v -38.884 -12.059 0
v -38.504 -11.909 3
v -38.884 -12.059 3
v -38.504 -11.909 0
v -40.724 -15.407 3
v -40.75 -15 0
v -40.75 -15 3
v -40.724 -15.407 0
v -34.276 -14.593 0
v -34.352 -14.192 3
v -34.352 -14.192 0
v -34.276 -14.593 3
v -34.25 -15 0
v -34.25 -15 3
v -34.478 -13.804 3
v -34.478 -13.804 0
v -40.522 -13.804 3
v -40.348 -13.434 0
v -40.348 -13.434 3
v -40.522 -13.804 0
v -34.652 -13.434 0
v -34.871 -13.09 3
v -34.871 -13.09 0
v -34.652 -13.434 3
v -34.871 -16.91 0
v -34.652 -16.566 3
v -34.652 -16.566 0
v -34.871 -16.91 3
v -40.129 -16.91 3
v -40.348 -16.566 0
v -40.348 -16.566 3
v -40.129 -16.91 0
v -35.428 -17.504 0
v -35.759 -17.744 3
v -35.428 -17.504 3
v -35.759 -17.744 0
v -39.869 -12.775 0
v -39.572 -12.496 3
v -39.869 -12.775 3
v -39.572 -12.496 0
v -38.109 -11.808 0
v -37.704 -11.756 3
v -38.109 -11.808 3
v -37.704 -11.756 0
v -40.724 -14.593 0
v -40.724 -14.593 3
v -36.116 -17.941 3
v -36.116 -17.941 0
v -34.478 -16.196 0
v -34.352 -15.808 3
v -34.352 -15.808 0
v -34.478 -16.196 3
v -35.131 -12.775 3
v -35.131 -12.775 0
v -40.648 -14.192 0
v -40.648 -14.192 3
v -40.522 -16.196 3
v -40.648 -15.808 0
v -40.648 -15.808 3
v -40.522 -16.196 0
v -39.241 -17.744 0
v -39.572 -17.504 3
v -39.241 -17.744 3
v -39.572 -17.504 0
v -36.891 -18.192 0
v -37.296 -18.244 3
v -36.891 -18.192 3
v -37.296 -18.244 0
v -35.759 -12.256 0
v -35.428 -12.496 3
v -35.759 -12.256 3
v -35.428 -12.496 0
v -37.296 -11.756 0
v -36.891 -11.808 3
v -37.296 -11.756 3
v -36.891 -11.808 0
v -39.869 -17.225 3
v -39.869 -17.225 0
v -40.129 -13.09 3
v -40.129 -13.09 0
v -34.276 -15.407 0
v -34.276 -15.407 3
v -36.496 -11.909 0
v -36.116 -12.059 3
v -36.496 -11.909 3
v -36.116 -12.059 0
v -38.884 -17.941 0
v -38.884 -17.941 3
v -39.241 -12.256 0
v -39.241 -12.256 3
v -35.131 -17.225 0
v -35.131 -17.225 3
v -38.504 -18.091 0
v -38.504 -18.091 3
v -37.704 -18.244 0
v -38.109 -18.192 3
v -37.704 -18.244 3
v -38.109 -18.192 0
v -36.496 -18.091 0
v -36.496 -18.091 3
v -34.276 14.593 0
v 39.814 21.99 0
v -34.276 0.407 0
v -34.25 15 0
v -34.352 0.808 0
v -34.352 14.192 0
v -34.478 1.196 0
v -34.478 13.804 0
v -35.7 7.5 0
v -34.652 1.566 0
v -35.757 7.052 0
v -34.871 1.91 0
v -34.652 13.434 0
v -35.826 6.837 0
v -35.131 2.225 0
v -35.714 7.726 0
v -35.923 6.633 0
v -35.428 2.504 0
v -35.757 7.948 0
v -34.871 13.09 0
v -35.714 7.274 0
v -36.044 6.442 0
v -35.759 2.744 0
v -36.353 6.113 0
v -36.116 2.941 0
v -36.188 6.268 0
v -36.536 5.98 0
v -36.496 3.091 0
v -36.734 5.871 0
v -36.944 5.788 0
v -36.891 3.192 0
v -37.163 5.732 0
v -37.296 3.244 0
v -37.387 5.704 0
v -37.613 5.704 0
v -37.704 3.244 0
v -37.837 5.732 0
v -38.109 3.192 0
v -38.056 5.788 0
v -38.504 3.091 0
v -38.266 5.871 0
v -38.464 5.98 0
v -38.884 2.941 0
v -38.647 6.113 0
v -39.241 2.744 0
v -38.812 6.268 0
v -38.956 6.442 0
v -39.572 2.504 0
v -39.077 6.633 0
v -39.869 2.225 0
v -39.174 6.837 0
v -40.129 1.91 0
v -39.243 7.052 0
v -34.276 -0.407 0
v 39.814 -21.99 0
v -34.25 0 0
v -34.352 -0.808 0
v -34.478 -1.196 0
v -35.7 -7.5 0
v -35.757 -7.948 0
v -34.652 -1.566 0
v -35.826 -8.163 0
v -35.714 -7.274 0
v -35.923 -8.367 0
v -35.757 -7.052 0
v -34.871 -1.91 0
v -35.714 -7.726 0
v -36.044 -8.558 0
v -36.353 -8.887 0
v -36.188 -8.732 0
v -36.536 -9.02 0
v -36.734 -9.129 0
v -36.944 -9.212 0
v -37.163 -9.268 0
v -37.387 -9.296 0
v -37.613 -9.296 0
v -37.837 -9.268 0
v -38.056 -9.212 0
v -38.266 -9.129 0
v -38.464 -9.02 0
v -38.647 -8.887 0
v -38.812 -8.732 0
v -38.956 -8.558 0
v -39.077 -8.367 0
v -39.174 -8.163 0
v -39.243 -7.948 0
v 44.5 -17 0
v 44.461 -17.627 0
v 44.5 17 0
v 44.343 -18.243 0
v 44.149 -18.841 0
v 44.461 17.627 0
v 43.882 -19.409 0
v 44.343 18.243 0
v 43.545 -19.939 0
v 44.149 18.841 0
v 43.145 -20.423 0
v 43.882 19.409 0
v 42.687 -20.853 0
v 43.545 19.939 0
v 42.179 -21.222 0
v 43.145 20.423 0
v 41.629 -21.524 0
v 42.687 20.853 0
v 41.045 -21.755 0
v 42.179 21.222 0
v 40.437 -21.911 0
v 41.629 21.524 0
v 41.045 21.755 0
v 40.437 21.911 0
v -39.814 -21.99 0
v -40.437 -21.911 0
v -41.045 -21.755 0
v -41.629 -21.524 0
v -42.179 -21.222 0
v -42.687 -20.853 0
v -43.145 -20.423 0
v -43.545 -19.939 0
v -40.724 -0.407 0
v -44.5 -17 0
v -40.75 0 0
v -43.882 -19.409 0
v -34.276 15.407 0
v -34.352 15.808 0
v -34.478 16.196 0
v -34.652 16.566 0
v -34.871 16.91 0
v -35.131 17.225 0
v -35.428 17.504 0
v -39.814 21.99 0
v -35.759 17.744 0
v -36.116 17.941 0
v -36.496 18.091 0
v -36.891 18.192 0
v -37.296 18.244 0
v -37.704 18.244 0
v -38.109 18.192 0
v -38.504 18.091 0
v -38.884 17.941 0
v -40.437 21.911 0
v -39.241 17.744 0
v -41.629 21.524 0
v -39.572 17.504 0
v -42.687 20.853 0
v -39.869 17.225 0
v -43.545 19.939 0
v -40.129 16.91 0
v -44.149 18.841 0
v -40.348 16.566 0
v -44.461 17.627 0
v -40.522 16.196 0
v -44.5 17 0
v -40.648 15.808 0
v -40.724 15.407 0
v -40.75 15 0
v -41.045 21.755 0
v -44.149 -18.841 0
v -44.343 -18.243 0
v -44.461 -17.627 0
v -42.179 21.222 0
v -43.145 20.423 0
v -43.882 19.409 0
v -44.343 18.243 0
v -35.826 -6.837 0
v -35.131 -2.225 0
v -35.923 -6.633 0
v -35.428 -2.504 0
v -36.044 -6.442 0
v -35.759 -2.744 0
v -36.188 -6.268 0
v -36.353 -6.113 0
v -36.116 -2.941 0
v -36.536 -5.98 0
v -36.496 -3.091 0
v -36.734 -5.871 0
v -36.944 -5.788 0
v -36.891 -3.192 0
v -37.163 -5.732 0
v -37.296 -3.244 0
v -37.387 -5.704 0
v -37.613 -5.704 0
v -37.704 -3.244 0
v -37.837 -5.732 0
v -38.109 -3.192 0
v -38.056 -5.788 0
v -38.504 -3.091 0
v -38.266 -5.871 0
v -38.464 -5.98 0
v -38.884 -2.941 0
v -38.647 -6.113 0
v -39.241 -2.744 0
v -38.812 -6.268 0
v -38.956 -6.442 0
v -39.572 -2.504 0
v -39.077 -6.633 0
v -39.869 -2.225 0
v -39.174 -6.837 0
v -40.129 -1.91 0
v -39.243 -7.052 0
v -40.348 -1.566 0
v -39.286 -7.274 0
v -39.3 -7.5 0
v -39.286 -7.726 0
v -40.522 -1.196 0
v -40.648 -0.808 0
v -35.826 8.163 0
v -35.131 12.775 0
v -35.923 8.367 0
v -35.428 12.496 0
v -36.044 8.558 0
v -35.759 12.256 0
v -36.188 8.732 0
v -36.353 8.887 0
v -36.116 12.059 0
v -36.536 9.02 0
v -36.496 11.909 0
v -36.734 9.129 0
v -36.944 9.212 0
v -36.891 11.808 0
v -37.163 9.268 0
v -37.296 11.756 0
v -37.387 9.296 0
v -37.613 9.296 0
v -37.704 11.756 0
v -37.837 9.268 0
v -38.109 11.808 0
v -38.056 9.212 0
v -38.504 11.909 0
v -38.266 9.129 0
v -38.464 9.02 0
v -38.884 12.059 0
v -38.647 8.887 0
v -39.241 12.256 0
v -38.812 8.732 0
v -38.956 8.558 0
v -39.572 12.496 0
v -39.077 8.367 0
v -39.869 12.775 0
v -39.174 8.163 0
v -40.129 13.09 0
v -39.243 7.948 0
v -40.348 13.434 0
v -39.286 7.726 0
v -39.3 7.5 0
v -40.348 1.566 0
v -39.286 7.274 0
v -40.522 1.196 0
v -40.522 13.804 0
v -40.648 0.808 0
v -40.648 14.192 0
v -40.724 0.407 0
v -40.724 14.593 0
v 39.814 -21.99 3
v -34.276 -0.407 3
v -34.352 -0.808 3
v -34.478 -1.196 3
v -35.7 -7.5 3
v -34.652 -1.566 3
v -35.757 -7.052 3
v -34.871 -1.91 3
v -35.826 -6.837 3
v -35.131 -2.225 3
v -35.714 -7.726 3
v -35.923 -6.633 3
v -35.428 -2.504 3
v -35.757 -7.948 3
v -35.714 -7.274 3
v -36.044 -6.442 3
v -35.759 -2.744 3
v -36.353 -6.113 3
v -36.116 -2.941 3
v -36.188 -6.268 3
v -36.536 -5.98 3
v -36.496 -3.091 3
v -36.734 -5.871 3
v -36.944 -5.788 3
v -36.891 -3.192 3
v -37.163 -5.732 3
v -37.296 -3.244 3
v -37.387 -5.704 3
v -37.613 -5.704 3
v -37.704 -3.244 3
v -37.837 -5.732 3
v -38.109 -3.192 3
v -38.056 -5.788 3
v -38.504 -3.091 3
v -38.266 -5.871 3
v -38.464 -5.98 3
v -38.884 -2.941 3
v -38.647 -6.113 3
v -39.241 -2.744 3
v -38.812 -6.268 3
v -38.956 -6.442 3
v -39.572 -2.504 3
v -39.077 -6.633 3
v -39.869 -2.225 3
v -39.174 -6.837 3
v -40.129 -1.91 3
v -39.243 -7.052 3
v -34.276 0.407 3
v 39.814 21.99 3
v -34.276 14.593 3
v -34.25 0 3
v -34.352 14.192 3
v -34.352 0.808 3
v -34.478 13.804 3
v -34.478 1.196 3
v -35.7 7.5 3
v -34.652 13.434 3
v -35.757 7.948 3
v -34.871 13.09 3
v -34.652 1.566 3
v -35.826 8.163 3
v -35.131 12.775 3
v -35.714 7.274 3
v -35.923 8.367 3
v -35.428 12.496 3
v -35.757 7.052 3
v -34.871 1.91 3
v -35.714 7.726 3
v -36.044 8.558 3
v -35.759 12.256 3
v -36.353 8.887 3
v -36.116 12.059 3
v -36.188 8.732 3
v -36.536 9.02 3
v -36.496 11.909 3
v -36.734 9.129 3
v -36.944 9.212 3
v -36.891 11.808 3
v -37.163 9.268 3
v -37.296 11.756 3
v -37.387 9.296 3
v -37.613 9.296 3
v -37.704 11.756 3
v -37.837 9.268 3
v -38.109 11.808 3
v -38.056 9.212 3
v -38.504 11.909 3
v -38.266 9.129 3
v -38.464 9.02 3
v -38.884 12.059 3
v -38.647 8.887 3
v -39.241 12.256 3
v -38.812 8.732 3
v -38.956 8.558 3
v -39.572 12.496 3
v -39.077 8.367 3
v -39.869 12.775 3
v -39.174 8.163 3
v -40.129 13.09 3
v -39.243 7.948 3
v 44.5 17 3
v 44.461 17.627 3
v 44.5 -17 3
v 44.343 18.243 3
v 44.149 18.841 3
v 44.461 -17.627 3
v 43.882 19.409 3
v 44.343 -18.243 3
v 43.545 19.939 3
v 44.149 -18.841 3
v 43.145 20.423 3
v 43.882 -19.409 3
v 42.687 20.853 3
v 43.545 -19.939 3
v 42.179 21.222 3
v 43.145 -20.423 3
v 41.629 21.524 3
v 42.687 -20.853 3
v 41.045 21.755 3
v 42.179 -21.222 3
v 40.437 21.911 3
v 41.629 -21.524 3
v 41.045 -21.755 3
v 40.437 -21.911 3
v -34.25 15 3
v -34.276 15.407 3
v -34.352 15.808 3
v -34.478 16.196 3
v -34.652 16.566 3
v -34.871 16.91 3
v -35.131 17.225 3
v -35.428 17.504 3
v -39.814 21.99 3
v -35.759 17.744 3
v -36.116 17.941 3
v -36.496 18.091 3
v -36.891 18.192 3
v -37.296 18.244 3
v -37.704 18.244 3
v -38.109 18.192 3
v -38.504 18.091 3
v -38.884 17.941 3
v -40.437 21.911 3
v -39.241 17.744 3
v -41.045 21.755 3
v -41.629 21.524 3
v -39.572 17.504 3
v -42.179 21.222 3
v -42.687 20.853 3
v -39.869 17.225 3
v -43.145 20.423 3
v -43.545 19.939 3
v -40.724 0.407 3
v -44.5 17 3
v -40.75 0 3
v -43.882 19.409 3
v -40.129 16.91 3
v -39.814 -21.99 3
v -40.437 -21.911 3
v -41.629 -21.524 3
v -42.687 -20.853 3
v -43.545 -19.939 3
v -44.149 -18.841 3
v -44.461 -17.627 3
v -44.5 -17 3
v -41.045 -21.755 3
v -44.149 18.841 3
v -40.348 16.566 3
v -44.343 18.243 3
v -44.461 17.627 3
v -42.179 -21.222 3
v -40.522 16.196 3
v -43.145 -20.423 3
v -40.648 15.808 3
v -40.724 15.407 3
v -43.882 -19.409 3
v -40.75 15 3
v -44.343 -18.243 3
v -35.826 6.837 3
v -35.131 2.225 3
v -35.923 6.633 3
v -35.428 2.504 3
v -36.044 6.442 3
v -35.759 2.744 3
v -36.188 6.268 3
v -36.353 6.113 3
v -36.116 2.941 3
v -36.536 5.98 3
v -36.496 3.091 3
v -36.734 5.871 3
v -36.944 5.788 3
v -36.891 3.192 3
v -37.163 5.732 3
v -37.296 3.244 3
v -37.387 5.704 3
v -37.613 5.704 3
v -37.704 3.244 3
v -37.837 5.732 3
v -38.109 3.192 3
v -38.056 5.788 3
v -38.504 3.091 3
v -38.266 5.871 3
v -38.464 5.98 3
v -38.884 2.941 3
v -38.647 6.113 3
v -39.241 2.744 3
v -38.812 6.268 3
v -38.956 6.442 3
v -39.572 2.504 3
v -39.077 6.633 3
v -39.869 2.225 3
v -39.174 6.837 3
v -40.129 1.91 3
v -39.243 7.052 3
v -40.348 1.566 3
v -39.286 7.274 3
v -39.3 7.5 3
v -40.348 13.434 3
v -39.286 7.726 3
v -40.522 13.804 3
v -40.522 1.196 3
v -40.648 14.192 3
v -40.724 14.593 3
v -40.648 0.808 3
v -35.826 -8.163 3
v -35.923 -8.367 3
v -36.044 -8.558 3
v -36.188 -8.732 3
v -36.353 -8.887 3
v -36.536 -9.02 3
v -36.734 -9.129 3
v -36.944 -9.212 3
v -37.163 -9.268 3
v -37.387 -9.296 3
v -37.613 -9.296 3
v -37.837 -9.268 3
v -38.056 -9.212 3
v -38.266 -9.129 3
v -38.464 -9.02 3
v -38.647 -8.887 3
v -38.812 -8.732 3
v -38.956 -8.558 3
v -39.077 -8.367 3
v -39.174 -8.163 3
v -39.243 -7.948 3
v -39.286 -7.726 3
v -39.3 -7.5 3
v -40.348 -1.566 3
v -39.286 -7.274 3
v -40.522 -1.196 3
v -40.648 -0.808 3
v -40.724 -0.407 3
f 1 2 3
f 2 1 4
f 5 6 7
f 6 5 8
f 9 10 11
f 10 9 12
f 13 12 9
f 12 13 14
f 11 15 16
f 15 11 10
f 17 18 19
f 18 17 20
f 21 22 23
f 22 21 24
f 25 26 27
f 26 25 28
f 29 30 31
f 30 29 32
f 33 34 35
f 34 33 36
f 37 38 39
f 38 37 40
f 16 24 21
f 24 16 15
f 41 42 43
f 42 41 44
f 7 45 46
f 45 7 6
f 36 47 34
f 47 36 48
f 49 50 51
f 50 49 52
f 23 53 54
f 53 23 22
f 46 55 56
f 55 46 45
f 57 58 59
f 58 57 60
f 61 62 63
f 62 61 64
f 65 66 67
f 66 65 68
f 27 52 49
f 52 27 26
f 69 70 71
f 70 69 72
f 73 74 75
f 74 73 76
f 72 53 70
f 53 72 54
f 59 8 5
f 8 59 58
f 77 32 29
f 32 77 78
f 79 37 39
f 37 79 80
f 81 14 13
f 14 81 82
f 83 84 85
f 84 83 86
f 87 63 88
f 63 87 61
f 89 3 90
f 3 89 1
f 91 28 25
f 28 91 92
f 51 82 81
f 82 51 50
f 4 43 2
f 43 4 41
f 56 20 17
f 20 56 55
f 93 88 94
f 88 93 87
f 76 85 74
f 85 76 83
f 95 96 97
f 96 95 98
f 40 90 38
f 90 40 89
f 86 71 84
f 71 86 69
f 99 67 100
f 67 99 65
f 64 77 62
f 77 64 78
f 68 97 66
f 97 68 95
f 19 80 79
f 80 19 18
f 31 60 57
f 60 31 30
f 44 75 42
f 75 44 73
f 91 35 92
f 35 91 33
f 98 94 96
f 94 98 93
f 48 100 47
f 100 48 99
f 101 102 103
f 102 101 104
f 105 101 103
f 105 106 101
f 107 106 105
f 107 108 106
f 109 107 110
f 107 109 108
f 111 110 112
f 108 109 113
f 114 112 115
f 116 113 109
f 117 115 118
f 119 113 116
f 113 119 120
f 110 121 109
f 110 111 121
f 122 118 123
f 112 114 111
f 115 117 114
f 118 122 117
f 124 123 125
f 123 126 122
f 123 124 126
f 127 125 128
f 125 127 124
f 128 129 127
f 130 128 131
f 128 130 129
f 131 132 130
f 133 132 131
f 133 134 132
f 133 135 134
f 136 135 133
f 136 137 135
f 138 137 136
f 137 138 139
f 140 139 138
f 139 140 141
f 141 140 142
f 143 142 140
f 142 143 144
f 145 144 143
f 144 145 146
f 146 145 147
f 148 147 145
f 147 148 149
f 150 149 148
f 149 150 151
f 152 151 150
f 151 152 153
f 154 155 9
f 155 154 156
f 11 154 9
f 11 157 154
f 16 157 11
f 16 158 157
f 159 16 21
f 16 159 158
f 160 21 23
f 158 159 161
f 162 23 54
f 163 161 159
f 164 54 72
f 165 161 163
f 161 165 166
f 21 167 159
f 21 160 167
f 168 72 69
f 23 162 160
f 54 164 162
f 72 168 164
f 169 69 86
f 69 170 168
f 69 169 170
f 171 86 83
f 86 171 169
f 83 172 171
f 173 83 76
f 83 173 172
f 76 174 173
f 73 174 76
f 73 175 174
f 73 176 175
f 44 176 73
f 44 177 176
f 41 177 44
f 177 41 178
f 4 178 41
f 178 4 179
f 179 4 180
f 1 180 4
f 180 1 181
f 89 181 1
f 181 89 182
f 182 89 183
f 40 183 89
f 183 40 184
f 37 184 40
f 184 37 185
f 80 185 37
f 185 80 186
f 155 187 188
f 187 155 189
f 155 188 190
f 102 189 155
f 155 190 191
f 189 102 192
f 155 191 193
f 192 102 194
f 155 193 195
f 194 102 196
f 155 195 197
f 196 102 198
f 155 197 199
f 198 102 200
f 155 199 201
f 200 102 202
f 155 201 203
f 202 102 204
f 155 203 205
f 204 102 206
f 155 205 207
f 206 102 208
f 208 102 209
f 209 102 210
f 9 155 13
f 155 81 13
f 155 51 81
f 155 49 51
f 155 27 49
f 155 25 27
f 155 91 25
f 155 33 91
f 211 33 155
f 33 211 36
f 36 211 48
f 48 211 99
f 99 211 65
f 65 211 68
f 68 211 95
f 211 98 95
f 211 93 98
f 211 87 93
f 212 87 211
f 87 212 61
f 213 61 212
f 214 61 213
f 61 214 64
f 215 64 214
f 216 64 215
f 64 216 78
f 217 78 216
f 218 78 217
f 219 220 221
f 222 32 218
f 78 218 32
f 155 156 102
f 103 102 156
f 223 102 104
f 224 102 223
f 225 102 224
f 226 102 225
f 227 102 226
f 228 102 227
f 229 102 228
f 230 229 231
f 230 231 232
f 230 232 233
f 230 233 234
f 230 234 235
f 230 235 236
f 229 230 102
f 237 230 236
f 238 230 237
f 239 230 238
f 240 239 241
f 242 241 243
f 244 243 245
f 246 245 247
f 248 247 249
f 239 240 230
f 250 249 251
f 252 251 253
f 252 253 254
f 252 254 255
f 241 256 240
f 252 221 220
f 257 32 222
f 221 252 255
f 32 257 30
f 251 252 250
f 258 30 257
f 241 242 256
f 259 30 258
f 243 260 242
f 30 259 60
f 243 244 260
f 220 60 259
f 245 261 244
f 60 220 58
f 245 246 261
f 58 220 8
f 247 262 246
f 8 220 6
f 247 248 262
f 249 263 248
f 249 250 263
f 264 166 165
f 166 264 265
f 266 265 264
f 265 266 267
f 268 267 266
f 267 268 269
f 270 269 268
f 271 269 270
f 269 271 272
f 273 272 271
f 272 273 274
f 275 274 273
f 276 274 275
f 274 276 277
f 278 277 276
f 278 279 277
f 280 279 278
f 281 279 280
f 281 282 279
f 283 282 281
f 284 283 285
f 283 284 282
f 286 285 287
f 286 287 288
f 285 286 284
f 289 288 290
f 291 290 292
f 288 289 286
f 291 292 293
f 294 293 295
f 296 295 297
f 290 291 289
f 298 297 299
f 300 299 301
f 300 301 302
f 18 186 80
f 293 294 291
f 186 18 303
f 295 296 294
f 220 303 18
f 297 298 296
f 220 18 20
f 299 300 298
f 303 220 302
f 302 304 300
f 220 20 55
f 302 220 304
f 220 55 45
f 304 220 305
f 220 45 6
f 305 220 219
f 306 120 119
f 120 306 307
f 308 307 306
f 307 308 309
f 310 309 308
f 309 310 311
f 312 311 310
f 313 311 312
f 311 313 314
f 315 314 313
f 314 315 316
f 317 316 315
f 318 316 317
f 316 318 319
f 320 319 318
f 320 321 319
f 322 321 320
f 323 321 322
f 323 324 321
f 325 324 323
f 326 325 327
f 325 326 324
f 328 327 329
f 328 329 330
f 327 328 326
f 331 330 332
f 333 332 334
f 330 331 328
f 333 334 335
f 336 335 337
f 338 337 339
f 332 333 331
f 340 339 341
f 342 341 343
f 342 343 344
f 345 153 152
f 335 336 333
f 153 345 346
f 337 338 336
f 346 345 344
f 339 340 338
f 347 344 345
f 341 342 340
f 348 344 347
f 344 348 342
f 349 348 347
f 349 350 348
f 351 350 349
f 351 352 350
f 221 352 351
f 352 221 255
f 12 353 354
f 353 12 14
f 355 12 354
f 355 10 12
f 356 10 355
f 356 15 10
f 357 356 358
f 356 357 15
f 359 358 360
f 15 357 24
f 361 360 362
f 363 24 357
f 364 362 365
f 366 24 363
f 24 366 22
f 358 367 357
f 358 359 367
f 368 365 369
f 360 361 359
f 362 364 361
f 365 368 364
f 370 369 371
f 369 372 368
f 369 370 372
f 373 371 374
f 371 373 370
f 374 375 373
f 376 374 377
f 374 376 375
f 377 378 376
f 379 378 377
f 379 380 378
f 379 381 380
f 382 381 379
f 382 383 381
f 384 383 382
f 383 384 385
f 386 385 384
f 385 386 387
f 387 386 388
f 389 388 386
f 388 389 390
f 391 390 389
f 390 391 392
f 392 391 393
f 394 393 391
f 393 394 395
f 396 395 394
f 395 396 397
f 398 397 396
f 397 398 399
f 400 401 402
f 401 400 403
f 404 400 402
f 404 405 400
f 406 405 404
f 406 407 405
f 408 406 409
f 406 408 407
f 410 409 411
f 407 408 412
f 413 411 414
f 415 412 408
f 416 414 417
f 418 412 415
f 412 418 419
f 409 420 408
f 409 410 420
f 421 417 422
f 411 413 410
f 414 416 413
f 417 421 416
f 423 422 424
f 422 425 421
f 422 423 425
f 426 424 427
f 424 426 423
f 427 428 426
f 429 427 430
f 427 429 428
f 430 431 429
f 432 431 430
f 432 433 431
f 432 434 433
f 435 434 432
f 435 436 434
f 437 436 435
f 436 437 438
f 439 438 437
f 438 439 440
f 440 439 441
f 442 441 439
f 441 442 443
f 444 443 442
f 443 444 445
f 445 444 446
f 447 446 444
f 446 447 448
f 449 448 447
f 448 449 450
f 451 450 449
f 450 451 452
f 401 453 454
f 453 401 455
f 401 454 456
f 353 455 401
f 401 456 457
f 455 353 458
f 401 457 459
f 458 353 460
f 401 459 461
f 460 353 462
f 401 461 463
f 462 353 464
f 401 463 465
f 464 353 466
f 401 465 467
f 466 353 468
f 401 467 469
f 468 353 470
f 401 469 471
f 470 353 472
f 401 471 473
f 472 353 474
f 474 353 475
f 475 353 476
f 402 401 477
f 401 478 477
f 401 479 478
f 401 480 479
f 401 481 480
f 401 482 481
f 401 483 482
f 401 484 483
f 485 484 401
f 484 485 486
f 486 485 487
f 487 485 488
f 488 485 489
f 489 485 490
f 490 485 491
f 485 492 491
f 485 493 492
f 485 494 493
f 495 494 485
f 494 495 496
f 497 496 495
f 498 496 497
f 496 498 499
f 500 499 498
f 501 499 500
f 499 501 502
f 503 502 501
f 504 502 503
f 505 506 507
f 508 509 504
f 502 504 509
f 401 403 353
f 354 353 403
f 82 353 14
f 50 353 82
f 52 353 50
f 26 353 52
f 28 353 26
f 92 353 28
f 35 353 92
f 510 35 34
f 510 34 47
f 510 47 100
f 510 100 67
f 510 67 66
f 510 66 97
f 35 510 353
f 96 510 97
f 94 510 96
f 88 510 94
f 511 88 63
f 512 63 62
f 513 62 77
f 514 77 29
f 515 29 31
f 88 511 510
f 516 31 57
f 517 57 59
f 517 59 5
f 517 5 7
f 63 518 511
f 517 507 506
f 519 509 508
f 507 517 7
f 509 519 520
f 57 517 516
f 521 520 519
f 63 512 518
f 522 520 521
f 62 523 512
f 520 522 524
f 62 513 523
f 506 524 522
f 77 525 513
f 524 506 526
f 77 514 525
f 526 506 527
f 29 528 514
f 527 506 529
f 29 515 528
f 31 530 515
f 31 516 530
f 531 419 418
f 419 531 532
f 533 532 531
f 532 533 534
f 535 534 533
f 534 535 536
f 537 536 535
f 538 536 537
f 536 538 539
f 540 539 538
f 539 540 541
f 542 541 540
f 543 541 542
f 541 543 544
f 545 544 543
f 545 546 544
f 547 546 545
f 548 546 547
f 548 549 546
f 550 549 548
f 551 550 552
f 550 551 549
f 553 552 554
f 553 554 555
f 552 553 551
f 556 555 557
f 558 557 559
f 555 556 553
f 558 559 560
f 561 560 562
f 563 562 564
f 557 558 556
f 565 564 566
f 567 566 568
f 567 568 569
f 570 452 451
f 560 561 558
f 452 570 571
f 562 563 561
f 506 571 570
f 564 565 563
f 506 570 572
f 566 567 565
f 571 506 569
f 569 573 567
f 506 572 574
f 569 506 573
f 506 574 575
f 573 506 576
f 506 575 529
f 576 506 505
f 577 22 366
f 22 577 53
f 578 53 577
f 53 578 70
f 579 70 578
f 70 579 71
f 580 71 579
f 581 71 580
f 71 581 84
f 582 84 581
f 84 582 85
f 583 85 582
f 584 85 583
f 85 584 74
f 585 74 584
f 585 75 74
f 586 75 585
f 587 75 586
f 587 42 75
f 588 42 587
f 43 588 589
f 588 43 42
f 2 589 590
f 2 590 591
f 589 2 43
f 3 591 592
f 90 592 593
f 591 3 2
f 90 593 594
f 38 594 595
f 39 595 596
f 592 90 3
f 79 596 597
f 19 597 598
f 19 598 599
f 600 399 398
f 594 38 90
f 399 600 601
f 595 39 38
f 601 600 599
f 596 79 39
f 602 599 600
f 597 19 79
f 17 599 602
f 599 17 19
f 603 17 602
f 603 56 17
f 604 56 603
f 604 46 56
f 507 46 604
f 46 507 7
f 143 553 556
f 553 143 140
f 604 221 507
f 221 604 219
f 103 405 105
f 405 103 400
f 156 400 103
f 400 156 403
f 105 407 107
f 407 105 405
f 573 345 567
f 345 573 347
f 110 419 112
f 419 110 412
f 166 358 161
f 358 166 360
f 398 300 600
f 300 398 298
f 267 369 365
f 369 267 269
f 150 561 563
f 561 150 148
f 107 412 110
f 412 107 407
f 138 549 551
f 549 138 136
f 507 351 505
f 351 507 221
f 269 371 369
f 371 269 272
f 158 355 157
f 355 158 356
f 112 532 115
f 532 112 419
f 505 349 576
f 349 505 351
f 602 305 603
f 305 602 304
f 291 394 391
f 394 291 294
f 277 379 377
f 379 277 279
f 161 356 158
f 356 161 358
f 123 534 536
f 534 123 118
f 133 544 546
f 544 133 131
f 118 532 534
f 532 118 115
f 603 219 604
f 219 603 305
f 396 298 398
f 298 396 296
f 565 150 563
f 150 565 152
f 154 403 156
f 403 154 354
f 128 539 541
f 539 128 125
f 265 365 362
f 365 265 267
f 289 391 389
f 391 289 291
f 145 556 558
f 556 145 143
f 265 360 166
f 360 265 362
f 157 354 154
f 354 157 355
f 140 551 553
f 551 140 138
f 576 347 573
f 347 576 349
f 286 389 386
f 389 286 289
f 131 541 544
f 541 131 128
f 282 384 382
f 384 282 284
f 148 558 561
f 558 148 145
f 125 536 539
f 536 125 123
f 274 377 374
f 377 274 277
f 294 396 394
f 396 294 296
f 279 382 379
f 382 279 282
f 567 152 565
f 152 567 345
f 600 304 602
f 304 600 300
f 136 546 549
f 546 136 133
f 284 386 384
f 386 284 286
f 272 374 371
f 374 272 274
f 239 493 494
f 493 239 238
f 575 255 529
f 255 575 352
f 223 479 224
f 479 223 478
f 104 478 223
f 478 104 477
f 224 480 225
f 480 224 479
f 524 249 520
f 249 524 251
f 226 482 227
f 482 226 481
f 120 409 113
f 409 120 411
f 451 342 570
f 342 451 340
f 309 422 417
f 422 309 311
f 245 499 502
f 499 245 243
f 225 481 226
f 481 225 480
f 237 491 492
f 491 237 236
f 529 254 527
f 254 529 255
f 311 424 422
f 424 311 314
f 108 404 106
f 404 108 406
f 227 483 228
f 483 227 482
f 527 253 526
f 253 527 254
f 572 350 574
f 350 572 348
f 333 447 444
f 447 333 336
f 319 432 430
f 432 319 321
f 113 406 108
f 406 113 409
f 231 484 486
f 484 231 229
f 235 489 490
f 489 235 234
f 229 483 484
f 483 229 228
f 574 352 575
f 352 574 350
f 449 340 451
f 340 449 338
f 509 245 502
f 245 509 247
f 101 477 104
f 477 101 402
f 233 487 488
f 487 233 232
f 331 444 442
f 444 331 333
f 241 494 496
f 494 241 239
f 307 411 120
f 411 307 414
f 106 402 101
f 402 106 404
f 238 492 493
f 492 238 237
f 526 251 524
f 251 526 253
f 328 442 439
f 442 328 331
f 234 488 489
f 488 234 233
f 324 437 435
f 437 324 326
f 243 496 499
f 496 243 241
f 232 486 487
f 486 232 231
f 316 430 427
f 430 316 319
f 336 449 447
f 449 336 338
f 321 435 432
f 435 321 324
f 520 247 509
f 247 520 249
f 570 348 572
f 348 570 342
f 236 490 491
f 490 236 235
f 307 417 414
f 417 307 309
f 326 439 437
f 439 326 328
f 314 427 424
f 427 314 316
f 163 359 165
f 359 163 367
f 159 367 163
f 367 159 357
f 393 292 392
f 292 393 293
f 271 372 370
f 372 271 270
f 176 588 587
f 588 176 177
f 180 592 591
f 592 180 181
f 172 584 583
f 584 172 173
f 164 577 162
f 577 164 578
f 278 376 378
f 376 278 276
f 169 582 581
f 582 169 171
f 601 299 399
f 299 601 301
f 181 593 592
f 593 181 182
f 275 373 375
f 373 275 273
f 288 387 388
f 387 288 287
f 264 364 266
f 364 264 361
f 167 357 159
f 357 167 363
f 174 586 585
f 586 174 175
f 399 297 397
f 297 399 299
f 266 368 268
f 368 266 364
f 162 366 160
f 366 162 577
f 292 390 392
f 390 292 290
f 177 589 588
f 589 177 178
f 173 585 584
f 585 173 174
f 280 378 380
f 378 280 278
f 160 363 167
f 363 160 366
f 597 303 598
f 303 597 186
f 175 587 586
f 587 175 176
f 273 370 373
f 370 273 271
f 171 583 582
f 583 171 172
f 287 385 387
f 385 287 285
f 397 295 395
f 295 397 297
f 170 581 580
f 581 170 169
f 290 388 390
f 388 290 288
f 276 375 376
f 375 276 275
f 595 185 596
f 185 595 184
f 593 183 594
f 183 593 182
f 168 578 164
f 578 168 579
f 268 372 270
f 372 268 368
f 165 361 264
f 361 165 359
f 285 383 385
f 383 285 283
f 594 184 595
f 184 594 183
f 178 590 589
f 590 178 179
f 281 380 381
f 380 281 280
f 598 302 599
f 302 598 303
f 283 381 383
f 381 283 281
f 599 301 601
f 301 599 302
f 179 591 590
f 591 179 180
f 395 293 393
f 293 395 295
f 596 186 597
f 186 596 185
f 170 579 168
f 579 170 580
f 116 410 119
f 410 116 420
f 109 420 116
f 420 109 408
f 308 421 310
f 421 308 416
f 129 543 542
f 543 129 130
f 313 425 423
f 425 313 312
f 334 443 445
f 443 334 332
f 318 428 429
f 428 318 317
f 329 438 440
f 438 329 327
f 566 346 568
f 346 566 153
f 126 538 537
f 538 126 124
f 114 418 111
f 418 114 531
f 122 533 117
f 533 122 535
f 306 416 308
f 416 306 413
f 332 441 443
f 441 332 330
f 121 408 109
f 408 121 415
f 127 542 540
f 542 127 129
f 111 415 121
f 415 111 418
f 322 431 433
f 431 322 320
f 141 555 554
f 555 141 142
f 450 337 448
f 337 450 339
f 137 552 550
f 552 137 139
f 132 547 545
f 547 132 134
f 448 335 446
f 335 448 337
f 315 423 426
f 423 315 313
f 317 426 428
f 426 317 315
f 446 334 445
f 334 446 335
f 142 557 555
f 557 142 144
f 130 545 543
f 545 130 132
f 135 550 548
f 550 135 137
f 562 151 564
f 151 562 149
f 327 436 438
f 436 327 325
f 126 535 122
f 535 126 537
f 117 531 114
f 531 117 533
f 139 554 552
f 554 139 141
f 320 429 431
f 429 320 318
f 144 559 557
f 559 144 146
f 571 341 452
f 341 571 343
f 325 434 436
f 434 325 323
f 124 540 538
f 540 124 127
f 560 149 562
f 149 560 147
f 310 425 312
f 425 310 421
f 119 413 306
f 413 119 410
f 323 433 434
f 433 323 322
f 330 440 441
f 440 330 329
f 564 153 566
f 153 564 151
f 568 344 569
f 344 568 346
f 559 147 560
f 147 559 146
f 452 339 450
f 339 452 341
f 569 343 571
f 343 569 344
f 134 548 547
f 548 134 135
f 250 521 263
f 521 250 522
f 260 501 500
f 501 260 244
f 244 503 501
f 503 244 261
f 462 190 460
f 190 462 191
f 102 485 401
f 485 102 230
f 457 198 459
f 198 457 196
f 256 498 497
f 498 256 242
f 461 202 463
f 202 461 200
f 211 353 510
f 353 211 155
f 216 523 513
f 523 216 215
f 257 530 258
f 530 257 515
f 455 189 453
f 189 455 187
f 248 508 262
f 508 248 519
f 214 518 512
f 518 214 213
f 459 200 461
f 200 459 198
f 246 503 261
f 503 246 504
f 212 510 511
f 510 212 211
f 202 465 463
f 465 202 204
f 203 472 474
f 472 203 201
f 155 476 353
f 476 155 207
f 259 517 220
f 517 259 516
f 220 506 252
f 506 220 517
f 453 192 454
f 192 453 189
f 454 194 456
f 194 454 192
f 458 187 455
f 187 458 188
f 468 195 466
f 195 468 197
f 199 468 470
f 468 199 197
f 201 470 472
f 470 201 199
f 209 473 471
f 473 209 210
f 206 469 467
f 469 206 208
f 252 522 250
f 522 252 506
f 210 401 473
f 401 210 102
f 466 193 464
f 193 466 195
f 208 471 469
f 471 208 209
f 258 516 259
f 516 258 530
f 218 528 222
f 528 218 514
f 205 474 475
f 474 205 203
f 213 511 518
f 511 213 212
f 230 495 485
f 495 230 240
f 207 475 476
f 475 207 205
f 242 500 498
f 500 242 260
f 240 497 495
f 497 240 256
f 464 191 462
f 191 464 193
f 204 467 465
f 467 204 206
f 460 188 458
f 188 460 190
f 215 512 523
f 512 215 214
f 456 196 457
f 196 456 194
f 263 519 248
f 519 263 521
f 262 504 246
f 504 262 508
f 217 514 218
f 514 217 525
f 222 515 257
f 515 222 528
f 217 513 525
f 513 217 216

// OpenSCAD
$fn = 50;


difference() {
	union() {
		hull() {
			translate(v = [-39.5000000000, 17.0000000000, 0]) {
				cylinder(h = 3, r = 5);
			}
			translate(v = [39.5000000000, 17.0000000000, 0]) {
				cylinder(h = 3, r = 5);
			}
			translate(v = [-39.5000000000, -17.0000000000, 0]) {
				cylinder(h = 3, r = 5);
			}
			translate(v = [39.5000000000, -17.0000000000, 0]) {
				cylinder(h = 3, r = 5);
			}
		}
	}
	union() {
		translate(v = [-37.5000000000, -15.0000000000, 0]) {
			cylinder(h = 3, r = 3.2500000000);
		}
		translate(v = [-37.5000000000, 0.0000000000, 0]) {
			cylinder(h = 3, r = 3.2500000000);
		}
		translate(v = [-37.5000000000, 15.0000000000, 0]) {
			cylinder(h = 3, r = 3.2500000000);
		}
		translate(v = [-37.5000000000, -15.0000000000, 0]) {
			cylinder(h = 3, r = 1.8000000000);
		}
		translate(v = [-37.5000000000, -7.5000000000, 0]) {
			cylinder(h = 3, r = 1.8000000000);
		}
		translate(v = [-37.5000000000, 0.0000000000, 0]) {
			cylinder(h = 3, r = 1.8000000000);
		}
		translate(v = [-37.5000000000, 7.5000000000, 0]) {
			cylinder(h = 3, r = 1.8000000000);
		}
		translate(v = [-37.5000000000, 15.0000000000, 0]) {
			cylinder(h = 3, r = 1.8000000000);
		}
		translate(v = [-37.5000000000, -15.0000000000, 0]) {
			cylinder(h = 3, r = 1.8000000000);
		}
		translate(v = [-37.5000000000, -7.5000000000, 0]) {
			cylinder(h = 3, r = 1.8000000000);
		}
		translate(v = [-37.5000000000, 0.0000000000, 0]) {
			cylinder(h = 3, r = 1.8000000000);
		}
		translate(v = [-37.5000000000, 7.5000000000, 0]) {
			cylinder(h = 3, r = 1.8000000000);
		}
		translate(v = [-37.5000000000, 15.0000000000, 0]) {
			cylinder(h = 3, r = 1.8000000000);
		}
		translate(v = [-37.5000000000, -15.0000000000, 0]) {
			cylinder(h = 3, r = 1.8000000000);
		}
		translate(v = [-37.5000000000, -7.5000000000, 0]) {
			cylinder(h = 3, r = 1.8000000000);
		}
		translate(v = [-37.5000000000, 0.0000000000, 0]) {
			cylinder(h = 3, r = 1.8000000000);
		}
		translate(v = [-37.5000000000, 7.5000000000, 0]) {
			cylinder(h = 3, r = 1.8000000000);
		}
		translate(v = [-37.5000000000, 15.0000000000, 0]) {
			cylinder(h = 3, r = 1.8000000000);
		}
	}
}
